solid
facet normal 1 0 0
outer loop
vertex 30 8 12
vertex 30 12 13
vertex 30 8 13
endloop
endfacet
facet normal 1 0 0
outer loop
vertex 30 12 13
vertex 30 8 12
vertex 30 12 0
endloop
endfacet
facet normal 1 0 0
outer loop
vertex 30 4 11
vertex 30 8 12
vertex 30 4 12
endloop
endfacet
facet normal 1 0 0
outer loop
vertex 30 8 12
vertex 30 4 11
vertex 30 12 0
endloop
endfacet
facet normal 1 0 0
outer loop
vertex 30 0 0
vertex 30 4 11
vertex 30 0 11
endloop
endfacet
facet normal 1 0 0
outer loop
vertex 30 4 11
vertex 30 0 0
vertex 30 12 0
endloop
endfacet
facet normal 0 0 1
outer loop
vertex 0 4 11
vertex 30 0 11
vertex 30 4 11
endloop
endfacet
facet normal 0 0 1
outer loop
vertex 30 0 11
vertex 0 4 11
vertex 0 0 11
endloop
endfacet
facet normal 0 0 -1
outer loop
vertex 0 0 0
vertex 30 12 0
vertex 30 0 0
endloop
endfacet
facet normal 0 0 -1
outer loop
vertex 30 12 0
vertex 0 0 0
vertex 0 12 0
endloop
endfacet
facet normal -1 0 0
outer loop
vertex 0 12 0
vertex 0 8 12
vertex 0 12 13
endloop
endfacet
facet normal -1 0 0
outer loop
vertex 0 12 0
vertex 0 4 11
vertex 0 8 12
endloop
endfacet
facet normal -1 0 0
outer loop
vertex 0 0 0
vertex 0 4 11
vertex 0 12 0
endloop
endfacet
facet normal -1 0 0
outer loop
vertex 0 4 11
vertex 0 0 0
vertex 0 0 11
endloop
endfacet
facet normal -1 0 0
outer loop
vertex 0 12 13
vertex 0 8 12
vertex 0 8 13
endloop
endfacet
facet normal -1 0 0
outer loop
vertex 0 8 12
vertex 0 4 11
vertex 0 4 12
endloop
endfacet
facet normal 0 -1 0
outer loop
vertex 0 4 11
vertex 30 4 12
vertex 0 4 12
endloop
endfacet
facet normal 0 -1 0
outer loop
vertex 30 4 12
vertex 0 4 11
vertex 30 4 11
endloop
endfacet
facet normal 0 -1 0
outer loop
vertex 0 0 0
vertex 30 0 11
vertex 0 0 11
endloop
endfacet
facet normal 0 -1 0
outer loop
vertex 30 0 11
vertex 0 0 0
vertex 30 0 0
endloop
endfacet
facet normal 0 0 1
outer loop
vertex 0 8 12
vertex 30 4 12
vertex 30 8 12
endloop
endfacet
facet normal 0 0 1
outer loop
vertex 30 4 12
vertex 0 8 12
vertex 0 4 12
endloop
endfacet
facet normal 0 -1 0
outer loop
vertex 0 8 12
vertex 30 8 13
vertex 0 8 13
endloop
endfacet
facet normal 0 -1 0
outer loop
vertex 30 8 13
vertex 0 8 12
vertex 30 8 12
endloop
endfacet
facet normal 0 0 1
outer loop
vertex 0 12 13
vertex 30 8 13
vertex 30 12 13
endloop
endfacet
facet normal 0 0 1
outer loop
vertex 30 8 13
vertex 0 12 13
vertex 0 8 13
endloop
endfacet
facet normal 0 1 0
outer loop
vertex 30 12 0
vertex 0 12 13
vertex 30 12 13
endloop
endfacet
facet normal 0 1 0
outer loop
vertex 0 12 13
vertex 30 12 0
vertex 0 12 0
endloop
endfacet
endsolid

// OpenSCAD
height = 11;
step = 3;
long = 30;
larg = 4;

union()
{
    for (i = [0 : 1 : step - 1])
    {
        translate([0, larg * i, 0])
        cube([long, larg, height + i]);
    }
}
